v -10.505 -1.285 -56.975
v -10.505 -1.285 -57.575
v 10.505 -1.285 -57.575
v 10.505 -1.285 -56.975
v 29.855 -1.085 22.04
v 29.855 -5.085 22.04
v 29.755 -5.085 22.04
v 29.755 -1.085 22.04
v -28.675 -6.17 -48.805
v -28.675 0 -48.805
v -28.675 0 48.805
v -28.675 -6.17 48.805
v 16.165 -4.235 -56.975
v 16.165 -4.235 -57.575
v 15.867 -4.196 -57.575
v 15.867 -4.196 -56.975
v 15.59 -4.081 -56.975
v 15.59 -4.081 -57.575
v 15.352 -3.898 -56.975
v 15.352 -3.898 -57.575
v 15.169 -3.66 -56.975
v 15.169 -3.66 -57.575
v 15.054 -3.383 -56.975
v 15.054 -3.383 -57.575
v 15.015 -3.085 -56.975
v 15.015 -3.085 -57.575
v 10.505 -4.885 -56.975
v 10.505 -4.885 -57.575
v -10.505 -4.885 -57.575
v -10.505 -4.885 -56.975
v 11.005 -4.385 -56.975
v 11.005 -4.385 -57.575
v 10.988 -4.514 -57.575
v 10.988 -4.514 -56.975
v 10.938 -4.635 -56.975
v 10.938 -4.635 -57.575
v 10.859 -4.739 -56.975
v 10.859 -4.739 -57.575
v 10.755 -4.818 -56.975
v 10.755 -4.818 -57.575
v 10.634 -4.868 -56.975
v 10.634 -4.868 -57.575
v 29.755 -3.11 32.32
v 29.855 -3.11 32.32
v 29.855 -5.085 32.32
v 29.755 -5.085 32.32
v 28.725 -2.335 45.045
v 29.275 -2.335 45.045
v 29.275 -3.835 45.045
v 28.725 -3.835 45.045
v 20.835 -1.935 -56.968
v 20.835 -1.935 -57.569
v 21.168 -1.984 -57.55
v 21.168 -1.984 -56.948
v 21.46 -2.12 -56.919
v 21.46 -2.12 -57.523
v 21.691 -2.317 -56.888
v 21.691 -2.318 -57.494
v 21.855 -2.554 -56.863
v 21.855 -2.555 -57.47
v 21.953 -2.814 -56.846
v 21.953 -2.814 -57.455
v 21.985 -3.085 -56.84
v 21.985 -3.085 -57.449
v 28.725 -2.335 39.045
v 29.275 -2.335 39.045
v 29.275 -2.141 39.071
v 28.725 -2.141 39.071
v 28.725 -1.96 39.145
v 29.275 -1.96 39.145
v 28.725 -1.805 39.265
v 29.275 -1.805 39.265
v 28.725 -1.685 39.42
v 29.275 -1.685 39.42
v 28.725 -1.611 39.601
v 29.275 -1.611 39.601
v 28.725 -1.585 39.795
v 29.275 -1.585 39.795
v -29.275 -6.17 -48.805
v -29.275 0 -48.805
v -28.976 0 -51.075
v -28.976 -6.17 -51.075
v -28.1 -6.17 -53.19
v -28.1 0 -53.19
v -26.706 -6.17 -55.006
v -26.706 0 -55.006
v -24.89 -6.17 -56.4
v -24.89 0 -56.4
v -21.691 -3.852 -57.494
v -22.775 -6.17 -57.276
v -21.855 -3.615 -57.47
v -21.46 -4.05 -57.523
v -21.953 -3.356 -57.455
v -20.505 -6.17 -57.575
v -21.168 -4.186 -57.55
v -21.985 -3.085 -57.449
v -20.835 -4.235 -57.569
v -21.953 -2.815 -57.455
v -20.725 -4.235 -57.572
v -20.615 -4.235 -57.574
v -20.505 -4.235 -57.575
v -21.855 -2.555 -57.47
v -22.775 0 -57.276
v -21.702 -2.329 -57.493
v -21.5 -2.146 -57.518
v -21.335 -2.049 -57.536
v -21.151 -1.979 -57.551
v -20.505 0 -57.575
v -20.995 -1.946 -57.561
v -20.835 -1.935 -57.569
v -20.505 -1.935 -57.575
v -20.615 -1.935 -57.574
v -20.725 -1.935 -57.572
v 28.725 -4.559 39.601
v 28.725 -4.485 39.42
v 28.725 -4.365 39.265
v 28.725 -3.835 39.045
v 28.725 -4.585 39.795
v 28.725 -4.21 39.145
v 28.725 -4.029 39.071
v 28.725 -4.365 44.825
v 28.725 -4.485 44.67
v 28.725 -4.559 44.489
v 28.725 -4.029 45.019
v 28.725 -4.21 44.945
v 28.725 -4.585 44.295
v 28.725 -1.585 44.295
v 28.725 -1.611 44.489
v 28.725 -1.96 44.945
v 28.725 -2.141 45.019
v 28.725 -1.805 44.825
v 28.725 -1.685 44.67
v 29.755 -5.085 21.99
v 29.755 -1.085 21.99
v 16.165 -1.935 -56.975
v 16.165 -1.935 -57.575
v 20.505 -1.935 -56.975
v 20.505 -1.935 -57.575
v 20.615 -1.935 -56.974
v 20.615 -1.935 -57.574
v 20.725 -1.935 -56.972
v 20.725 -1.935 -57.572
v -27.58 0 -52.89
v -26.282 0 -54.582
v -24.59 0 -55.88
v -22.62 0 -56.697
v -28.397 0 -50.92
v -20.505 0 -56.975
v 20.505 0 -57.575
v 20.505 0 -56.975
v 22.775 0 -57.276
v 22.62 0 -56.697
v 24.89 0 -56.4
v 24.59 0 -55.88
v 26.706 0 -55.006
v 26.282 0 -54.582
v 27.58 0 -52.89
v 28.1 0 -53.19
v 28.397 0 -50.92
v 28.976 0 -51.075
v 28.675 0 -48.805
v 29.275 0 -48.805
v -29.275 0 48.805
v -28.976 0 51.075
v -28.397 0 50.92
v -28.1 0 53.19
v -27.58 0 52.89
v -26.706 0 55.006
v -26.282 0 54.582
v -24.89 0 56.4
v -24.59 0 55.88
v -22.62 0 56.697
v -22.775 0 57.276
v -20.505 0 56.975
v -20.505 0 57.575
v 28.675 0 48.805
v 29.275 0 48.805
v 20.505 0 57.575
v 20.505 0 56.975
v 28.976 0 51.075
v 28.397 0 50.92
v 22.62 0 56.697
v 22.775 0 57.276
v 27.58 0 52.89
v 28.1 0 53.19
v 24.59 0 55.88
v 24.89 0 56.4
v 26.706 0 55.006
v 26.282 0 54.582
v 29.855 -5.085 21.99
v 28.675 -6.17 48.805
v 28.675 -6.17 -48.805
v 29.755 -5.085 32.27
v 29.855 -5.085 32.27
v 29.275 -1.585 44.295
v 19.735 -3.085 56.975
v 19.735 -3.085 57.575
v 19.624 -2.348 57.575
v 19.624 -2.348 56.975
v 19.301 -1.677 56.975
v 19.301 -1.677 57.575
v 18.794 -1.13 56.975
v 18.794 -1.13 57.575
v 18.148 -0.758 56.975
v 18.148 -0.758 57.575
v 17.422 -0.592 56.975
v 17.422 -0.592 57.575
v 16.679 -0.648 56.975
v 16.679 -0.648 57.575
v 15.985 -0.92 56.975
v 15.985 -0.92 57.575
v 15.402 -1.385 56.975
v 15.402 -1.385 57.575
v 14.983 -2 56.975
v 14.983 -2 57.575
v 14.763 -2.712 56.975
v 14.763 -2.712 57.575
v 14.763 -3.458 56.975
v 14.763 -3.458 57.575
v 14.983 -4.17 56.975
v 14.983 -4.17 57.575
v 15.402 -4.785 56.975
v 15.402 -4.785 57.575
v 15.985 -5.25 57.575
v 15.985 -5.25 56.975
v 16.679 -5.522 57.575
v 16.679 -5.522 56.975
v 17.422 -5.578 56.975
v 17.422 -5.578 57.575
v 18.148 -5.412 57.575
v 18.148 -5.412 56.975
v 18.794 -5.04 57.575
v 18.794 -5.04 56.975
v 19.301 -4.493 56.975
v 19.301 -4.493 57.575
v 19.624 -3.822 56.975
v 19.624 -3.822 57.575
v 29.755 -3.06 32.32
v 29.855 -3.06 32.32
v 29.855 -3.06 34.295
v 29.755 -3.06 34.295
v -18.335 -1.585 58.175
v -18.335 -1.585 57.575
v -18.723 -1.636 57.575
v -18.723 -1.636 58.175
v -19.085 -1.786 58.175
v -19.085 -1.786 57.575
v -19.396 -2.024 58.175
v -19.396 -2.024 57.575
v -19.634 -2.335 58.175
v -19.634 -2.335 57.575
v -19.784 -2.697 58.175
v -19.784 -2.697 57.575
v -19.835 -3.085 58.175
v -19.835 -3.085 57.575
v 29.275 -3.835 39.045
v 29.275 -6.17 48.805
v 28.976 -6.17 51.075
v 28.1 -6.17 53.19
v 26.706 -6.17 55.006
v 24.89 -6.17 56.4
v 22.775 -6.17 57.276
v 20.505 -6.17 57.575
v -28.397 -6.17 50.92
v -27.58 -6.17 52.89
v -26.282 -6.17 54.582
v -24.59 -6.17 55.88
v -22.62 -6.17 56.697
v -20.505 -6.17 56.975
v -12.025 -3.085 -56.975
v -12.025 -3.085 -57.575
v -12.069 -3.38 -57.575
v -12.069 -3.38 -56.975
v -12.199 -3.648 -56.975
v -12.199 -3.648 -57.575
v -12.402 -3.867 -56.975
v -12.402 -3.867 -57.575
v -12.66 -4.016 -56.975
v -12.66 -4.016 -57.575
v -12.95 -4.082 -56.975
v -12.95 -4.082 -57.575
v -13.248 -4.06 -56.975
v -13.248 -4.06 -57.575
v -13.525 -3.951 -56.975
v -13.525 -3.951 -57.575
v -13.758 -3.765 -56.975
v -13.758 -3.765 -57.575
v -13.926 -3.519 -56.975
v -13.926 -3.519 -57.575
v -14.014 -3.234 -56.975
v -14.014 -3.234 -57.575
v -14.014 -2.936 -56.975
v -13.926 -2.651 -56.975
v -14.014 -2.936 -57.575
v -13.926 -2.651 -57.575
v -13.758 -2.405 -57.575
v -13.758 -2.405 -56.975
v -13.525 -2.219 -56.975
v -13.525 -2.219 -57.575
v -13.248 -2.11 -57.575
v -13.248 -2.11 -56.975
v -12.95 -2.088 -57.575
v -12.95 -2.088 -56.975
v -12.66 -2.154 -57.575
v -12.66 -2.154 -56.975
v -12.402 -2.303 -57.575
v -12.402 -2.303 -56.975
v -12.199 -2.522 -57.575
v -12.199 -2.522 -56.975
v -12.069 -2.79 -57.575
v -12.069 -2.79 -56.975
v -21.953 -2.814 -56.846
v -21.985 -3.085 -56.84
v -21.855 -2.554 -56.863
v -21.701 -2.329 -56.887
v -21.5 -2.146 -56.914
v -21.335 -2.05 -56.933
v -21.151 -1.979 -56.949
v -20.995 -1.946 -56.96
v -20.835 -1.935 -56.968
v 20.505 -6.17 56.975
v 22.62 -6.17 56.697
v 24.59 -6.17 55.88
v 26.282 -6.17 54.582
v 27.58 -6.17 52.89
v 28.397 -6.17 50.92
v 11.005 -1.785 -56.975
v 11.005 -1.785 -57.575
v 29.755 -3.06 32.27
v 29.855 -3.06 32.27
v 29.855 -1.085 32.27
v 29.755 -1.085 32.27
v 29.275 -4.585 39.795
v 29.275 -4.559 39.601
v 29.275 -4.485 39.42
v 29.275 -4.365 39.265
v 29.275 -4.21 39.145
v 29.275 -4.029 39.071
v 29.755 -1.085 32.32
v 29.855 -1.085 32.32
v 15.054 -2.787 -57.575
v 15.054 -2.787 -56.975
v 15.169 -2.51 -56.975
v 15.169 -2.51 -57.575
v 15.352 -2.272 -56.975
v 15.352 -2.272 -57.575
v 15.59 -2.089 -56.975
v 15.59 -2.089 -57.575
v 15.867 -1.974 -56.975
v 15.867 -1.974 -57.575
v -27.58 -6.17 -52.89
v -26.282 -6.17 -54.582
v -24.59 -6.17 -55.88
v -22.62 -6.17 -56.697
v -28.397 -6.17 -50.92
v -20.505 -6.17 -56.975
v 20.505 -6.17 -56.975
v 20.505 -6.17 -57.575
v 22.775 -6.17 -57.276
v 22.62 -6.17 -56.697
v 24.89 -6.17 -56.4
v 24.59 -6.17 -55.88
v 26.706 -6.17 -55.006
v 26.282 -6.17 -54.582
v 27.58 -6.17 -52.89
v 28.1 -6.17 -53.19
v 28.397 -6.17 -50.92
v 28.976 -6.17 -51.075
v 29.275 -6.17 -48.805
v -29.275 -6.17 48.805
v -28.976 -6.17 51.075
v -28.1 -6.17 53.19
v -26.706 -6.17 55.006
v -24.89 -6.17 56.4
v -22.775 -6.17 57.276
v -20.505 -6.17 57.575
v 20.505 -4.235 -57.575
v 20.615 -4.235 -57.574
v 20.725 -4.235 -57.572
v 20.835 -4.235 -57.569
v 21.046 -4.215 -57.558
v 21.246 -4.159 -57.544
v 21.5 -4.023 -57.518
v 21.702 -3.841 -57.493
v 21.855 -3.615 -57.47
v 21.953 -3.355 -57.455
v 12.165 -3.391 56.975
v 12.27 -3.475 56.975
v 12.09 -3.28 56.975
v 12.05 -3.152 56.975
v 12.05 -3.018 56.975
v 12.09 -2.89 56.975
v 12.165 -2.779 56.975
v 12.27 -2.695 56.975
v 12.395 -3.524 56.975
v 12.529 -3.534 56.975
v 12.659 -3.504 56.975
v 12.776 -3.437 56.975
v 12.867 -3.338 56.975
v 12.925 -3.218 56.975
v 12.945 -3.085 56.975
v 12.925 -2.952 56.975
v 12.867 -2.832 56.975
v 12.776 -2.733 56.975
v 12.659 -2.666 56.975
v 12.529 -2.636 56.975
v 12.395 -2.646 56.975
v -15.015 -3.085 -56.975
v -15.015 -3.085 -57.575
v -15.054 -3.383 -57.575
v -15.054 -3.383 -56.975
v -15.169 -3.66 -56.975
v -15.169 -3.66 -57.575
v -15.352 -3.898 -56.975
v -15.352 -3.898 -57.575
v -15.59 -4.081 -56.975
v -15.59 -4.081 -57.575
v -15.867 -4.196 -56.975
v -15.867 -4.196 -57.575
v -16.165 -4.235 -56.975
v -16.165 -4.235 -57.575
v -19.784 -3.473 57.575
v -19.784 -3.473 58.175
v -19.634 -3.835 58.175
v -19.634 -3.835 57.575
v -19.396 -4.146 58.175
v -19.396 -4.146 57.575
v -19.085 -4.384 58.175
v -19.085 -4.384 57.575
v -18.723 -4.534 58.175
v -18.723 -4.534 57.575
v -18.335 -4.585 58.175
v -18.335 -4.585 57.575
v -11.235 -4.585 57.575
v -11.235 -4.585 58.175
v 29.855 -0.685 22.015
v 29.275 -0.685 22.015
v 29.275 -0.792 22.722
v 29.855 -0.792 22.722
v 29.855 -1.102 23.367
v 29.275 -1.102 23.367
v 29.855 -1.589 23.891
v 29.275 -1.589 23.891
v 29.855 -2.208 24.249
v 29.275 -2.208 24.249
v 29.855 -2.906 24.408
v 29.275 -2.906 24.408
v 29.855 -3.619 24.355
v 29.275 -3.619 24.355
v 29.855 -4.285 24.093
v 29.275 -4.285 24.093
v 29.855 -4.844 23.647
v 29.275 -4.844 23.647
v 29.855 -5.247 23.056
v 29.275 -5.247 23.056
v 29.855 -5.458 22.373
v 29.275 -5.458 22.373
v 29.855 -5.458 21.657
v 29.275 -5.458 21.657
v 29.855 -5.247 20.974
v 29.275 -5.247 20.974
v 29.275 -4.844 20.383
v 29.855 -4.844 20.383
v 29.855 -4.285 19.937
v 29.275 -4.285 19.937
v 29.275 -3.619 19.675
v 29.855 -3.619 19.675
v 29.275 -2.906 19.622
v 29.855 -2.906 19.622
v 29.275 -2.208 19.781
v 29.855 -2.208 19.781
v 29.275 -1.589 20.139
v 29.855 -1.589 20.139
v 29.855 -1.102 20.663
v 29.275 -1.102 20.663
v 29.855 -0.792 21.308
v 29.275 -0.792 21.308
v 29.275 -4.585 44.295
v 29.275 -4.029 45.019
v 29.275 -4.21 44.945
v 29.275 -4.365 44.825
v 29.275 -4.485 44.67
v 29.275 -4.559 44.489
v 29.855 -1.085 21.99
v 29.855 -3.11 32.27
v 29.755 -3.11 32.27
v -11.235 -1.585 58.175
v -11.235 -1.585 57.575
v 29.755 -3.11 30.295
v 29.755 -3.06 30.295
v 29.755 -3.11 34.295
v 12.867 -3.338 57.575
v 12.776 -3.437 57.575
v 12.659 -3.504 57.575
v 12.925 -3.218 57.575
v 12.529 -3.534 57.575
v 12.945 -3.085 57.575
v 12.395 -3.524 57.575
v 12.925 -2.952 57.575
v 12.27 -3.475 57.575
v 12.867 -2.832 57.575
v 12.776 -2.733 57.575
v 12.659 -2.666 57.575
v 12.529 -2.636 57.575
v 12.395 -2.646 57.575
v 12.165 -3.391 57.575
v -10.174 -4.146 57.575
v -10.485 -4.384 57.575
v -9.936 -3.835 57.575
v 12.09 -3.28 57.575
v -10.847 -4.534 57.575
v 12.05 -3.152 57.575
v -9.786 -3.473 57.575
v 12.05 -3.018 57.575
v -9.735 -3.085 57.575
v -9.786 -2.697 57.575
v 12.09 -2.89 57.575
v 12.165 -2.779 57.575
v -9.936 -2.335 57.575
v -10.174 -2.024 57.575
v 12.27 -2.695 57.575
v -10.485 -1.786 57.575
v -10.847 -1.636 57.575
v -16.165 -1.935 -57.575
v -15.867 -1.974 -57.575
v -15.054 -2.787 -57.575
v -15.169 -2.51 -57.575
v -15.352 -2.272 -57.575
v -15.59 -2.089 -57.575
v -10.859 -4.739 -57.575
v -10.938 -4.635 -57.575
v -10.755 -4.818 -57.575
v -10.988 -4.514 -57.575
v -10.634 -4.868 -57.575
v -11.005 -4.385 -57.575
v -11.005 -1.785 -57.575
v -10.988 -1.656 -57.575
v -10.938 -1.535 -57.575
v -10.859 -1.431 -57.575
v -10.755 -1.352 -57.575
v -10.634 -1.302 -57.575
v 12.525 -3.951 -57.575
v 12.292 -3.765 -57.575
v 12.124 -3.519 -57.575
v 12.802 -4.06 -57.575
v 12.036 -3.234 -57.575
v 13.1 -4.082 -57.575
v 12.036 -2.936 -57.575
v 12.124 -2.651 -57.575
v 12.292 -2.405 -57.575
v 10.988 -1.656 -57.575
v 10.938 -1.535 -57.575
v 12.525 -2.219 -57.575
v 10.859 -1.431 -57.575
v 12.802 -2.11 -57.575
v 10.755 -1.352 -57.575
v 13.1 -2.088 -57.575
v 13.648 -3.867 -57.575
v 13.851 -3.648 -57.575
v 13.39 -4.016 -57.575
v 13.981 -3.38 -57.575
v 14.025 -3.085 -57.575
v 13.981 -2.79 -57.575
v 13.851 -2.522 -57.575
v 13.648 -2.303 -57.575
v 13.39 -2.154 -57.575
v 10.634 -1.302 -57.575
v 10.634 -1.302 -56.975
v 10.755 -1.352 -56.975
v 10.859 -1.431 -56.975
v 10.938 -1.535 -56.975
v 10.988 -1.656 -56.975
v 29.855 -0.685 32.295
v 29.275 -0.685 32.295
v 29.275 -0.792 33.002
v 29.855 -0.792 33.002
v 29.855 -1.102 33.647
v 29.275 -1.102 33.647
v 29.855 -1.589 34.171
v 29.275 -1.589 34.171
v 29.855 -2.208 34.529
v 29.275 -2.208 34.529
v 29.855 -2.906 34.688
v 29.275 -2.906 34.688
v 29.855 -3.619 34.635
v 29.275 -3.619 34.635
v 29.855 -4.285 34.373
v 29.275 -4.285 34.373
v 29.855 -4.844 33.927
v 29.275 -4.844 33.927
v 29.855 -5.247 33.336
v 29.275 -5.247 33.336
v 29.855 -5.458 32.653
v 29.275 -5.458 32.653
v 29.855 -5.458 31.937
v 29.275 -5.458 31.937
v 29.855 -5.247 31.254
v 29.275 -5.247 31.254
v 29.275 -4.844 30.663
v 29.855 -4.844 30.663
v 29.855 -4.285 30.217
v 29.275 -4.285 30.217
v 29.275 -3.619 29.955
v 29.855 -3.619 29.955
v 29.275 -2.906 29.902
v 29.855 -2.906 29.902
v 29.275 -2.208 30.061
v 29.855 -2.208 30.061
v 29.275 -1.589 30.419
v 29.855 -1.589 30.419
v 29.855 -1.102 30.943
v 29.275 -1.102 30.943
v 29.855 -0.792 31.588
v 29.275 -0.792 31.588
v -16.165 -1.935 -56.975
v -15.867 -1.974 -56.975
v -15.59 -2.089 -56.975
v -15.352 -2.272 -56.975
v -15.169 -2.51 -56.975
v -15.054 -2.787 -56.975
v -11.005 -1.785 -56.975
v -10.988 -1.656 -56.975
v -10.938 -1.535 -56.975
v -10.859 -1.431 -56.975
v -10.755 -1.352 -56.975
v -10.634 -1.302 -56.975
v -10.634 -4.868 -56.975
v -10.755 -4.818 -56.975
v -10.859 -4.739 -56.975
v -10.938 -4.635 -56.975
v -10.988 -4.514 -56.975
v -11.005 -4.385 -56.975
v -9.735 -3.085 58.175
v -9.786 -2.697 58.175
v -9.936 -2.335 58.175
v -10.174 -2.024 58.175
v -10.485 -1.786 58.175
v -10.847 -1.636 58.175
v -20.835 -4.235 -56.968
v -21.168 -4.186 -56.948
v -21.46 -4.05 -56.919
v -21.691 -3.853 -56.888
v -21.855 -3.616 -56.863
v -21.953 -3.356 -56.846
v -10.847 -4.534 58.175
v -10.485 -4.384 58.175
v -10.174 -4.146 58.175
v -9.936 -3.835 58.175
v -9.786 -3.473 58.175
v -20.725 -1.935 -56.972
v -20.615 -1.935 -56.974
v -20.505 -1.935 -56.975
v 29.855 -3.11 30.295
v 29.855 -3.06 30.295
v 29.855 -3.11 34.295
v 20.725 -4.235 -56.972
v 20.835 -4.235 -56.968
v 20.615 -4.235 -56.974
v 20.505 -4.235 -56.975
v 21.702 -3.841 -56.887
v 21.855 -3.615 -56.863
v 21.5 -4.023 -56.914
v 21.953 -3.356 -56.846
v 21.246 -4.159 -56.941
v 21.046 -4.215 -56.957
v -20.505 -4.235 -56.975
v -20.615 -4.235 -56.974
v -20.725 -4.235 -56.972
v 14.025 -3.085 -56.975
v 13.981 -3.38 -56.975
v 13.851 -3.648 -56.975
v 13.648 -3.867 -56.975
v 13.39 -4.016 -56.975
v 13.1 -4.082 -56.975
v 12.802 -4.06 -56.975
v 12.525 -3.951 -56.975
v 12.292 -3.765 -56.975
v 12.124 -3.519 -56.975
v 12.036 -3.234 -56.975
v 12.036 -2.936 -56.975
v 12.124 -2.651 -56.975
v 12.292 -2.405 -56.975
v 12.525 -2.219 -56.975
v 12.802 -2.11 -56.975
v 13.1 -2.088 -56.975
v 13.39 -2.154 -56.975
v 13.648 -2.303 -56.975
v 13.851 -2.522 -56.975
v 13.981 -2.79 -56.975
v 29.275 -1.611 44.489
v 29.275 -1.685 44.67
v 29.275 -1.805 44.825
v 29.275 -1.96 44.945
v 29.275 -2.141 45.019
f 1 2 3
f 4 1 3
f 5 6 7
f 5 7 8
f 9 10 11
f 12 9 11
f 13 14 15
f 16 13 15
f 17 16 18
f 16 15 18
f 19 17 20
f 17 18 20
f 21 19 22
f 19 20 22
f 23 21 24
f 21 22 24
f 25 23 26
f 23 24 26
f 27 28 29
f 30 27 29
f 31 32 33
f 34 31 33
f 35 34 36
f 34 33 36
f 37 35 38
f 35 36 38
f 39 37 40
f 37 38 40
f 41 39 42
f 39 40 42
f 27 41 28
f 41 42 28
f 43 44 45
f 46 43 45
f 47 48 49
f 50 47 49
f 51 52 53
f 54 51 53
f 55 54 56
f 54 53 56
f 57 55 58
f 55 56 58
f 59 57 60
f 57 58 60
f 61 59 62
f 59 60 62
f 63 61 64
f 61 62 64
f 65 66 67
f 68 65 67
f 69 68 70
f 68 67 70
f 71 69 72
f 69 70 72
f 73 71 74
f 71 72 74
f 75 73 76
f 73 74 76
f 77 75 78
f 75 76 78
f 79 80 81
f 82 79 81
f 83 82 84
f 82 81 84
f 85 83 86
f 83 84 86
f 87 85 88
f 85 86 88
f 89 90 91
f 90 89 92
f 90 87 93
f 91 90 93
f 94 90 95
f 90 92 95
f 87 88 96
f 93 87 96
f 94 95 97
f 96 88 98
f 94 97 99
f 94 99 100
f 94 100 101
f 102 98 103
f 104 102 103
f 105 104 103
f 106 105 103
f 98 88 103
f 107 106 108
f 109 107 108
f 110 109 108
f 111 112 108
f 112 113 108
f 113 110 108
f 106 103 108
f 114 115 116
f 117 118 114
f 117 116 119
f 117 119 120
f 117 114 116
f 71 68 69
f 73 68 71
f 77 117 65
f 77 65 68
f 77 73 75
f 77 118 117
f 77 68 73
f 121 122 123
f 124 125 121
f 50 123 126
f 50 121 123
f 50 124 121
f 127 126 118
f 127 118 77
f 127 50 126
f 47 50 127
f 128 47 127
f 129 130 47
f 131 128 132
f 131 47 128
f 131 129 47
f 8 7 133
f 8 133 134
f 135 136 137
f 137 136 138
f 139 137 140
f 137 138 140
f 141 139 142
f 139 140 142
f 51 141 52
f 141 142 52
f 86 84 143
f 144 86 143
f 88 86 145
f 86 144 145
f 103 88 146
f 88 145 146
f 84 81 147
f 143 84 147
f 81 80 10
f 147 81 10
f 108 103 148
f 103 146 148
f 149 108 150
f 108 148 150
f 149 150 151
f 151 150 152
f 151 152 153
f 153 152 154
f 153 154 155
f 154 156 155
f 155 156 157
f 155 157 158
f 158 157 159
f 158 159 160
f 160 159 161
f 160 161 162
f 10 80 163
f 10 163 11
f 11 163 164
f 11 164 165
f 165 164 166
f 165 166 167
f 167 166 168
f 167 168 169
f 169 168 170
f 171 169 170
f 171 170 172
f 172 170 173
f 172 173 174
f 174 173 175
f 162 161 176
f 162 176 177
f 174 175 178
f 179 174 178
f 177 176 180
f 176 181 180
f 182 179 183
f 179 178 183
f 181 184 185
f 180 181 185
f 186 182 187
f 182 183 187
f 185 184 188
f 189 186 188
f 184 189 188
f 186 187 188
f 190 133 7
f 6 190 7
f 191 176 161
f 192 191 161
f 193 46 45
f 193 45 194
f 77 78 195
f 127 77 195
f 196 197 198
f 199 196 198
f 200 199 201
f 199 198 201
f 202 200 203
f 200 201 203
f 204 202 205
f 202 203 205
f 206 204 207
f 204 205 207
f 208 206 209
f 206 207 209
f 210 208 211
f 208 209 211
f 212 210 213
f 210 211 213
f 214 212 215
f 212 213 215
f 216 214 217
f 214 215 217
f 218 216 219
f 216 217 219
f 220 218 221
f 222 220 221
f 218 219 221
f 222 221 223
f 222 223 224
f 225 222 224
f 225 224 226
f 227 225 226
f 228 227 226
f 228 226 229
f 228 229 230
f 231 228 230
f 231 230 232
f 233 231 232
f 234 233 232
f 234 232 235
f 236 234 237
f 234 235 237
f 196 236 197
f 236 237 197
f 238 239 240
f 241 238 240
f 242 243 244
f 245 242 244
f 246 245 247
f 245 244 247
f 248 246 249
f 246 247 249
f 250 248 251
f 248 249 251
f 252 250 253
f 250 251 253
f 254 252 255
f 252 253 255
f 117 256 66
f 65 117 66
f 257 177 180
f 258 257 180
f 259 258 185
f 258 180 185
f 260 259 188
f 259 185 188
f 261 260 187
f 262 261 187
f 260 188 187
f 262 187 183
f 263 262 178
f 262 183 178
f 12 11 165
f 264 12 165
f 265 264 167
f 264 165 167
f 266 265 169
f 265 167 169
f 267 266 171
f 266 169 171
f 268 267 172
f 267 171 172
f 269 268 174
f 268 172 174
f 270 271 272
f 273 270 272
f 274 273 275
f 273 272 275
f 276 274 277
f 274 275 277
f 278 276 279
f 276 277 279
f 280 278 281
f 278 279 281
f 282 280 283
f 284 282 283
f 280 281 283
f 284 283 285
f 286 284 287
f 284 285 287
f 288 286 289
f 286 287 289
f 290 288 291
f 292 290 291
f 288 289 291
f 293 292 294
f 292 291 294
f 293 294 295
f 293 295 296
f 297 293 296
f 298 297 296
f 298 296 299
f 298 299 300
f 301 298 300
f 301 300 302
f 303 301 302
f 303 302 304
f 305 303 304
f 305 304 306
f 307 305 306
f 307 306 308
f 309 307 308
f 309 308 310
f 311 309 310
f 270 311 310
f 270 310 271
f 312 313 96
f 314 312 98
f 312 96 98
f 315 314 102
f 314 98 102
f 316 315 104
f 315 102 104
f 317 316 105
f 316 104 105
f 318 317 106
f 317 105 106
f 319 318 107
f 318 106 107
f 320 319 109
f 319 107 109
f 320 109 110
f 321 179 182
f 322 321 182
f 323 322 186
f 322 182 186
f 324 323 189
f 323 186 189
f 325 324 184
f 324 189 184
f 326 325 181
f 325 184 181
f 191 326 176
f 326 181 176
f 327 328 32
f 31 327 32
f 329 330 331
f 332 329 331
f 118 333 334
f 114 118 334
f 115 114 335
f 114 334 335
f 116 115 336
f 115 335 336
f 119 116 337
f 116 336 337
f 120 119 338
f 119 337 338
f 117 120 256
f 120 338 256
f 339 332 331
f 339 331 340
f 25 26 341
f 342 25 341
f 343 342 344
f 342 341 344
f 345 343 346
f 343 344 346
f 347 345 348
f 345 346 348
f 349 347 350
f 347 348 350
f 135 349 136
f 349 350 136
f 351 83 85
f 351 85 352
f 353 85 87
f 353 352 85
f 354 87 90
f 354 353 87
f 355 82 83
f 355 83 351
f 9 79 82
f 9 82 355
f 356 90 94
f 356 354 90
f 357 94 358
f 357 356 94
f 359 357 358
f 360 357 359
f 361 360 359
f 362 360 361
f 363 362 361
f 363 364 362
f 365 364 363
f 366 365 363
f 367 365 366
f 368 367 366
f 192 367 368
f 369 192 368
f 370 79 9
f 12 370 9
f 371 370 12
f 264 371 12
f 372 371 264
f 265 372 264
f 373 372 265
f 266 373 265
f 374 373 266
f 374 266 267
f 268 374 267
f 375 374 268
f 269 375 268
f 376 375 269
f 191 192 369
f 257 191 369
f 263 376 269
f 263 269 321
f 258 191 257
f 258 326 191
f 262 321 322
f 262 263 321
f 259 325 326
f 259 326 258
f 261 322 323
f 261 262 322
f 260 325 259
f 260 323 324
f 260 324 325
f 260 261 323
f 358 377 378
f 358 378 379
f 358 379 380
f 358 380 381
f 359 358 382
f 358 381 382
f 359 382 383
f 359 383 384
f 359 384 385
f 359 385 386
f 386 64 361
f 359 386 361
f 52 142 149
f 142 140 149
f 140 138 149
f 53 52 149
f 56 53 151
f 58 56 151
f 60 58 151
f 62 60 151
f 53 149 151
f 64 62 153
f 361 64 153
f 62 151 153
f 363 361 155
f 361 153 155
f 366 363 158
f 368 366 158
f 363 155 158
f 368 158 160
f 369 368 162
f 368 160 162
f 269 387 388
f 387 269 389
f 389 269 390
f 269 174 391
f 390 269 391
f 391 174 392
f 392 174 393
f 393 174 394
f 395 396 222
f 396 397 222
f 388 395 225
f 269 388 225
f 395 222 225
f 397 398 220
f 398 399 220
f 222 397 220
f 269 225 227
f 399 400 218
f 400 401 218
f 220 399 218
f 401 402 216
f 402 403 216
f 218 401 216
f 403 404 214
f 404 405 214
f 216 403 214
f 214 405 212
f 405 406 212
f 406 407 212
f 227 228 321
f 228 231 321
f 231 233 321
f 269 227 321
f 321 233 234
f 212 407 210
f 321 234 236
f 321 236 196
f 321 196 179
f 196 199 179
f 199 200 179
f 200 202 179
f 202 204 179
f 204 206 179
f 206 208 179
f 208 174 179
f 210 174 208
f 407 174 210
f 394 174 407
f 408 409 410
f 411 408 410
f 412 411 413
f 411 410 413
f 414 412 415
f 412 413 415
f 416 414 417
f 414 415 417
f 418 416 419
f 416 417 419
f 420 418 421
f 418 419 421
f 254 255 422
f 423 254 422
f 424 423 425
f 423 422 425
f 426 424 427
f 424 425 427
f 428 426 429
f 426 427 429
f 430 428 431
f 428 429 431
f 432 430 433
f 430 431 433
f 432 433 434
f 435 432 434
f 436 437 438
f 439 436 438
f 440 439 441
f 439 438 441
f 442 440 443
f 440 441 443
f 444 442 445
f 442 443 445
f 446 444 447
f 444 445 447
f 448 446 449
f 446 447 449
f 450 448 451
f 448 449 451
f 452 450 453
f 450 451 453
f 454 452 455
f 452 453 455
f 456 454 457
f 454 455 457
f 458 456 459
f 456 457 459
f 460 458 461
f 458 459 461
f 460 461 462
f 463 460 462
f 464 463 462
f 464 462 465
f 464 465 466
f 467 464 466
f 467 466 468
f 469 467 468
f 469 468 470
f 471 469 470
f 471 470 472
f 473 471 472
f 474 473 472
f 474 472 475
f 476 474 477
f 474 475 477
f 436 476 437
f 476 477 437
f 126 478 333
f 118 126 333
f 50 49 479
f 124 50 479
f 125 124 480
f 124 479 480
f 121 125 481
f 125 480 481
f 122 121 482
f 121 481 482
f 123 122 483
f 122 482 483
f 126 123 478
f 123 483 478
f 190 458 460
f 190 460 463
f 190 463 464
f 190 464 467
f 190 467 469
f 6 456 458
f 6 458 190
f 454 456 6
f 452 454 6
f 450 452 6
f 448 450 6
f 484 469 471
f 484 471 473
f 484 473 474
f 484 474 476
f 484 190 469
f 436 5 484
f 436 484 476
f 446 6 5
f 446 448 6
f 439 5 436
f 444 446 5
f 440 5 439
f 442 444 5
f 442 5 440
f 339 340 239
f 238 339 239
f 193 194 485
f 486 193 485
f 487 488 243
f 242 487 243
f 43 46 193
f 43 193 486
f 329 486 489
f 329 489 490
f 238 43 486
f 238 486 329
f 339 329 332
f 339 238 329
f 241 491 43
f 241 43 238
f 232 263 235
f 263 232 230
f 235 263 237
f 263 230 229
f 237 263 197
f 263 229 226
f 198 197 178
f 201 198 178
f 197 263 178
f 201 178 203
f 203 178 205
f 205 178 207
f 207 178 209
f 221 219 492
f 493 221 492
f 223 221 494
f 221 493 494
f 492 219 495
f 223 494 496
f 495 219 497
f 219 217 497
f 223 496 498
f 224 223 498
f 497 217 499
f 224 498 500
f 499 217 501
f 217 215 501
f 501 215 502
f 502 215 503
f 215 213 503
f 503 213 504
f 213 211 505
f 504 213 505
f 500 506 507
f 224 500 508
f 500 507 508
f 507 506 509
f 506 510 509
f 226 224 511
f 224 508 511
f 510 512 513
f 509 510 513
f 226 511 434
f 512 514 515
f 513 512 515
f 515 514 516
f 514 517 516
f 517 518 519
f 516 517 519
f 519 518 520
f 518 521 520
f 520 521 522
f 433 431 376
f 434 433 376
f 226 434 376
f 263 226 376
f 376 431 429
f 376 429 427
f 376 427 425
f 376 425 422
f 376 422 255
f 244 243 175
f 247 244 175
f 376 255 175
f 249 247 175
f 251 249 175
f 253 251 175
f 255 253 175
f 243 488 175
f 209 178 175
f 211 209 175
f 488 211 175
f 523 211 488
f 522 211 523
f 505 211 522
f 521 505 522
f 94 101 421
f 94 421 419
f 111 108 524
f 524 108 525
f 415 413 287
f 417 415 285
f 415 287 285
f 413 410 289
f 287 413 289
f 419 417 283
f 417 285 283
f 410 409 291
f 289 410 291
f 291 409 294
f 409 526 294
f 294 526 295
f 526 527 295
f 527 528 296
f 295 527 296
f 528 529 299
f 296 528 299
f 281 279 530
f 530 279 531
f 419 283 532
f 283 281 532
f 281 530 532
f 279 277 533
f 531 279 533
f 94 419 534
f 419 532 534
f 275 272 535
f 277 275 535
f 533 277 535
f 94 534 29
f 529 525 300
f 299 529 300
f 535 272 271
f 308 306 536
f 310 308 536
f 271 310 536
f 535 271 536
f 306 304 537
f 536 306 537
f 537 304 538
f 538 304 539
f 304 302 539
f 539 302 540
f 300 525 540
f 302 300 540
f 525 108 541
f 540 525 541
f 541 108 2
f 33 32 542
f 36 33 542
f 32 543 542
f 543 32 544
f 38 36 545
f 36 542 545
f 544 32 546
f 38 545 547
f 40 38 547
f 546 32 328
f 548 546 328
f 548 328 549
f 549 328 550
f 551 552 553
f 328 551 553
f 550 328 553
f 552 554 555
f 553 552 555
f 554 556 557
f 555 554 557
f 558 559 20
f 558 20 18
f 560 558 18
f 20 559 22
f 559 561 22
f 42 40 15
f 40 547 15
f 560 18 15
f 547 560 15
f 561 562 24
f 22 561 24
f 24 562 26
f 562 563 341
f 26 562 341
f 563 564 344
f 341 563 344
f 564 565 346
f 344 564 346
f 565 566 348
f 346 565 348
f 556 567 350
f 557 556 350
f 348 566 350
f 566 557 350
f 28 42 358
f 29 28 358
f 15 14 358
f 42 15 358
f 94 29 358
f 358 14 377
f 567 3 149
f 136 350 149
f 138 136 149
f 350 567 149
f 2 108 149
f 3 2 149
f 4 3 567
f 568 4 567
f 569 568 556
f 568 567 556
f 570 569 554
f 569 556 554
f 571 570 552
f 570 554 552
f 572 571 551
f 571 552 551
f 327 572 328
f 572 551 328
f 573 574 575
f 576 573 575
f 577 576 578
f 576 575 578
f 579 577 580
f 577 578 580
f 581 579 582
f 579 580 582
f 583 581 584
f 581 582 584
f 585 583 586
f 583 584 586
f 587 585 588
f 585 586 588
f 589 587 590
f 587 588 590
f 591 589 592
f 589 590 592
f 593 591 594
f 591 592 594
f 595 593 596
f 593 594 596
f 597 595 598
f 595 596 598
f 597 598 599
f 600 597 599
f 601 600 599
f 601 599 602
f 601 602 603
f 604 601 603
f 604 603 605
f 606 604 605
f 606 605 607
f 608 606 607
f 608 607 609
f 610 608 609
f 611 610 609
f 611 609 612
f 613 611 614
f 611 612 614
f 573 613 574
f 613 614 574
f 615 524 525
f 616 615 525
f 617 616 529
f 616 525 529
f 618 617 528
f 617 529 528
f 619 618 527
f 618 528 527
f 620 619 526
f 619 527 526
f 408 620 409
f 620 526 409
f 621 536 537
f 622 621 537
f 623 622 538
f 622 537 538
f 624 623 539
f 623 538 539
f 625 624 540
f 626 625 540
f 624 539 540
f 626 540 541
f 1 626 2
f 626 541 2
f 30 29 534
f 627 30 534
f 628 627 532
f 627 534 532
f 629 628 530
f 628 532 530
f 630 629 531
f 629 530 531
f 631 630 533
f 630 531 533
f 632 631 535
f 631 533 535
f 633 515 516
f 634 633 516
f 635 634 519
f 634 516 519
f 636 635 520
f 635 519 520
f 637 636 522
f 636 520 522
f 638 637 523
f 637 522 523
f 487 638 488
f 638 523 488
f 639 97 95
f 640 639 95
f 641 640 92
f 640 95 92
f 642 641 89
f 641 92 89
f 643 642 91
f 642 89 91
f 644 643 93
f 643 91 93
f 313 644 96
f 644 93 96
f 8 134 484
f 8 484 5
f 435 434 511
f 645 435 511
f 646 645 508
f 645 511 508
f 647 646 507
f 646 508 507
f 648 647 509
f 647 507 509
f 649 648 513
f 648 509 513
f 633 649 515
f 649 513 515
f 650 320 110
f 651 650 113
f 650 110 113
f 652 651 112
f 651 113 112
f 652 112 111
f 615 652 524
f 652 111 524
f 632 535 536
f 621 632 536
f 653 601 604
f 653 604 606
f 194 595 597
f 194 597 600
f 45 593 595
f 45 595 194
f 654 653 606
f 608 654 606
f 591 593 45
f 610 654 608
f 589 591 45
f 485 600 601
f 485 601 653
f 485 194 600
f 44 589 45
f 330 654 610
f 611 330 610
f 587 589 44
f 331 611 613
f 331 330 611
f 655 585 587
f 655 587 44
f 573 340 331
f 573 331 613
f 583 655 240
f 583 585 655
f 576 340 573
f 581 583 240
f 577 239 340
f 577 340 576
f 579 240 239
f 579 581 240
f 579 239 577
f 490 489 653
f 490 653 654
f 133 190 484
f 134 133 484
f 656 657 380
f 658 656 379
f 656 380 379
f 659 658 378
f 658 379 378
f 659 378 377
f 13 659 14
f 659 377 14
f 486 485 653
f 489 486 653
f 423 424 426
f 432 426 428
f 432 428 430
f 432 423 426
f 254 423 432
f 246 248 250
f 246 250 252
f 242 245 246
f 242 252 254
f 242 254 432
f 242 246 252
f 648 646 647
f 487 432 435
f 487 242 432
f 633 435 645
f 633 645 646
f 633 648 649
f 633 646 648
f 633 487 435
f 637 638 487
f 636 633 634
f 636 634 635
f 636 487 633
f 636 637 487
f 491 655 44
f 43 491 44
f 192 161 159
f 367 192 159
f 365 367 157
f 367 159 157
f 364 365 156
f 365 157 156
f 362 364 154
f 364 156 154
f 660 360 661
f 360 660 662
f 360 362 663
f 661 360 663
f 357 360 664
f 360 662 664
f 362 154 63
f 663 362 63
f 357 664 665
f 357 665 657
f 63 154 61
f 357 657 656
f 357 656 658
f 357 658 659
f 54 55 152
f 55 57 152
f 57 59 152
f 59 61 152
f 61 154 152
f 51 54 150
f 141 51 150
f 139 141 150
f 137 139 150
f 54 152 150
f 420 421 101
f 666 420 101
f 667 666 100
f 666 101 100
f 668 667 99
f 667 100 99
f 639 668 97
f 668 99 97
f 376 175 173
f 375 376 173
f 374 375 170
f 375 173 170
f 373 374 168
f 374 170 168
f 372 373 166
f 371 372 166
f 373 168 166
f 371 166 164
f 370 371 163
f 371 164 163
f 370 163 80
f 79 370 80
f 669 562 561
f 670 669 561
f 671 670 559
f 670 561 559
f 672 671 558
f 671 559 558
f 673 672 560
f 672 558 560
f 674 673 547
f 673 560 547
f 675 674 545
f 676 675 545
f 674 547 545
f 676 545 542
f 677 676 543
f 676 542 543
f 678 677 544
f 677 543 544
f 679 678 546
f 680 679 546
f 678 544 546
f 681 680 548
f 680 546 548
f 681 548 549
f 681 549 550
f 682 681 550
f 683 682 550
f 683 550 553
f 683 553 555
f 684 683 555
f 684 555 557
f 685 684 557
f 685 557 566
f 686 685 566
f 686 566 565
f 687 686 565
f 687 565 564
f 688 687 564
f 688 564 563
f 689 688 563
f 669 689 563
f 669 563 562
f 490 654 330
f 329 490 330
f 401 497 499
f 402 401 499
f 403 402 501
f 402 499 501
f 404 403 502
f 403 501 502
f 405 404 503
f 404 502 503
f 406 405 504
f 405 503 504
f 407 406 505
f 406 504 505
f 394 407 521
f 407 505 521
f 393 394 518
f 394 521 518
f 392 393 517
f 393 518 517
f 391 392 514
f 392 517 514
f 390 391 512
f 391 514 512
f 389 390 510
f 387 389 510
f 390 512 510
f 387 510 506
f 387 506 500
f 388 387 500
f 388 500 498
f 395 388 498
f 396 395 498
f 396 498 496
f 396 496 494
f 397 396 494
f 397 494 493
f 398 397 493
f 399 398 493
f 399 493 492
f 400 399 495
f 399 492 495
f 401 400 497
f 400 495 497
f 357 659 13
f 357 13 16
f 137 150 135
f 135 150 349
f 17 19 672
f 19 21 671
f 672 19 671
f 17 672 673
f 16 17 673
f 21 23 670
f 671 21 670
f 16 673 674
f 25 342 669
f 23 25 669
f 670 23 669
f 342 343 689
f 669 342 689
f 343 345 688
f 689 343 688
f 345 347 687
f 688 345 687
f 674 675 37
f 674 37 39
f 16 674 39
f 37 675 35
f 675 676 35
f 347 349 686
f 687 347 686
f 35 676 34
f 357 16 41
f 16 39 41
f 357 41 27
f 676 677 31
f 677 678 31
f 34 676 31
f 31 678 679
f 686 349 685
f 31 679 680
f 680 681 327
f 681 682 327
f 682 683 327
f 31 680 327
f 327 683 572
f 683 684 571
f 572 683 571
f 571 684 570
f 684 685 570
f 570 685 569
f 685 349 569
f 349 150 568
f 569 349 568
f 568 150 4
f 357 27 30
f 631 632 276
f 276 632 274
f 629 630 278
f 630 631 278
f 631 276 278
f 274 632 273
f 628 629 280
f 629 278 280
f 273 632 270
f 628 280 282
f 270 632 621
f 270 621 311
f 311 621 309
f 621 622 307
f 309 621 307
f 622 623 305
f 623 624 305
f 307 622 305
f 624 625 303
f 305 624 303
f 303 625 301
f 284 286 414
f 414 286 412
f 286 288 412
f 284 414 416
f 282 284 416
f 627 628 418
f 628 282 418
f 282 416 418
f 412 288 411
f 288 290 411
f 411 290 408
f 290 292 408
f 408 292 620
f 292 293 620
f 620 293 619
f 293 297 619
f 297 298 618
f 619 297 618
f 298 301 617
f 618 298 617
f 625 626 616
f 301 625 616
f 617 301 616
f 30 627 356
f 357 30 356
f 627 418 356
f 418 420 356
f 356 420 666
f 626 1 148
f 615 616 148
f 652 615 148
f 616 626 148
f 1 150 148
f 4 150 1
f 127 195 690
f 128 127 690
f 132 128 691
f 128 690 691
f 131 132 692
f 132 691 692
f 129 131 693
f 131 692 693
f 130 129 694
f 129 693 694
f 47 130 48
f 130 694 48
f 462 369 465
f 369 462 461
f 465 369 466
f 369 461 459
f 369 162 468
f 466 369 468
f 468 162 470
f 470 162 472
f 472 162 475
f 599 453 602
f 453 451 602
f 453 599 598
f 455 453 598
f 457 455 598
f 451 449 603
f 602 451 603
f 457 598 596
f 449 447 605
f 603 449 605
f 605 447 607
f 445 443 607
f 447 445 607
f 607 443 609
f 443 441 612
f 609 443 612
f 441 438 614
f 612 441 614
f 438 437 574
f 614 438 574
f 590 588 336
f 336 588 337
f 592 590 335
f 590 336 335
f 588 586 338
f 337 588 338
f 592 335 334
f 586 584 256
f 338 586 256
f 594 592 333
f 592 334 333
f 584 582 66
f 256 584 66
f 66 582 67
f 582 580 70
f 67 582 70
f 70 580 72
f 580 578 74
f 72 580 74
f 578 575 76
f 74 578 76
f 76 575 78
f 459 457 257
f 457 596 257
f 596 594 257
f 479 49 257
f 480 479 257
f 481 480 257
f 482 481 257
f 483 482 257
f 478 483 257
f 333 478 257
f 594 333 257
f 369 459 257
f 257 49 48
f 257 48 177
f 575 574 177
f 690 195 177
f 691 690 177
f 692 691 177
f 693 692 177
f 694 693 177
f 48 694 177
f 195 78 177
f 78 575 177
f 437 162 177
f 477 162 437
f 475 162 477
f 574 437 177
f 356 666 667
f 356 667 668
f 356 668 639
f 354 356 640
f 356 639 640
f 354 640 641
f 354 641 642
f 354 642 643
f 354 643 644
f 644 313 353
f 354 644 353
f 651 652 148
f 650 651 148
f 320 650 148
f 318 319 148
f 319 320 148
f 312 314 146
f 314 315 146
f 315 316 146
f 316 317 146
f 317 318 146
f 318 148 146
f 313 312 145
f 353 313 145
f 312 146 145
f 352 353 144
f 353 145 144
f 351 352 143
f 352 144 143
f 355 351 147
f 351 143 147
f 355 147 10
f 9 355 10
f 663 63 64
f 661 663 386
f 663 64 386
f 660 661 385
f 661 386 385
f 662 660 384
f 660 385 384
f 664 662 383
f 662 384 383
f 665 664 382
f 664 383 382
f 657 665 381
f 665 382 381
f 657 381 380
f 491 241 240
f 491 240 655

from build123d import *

# Parameters (mm, degrees)
F1_DEPTH  = 6.17
F3_DEPTH  = 0.55
F2_R      = 2.4
F4_DEPTH  = 0.58
F6_W      = 4
F6_H      = 0.05
F7_DEPTH  = 0.1
F8_R      = 2.5
F8_R_2    = 0.45
F9_DEPTH  = 0.6
F10_DEPTH = 0.6
F11_R     = 1
F12_DEPTH = 0.7361696724


with BuildPart() as f1:
    # F0 (on Front) → F1 (new body)
    with BuildSketch(Plane.XZ):
        with BuildLine():
            Line((-20.505, -57.575), (20.505, -57.575))
            ThreePointArc((20.505, -57.575), (26.706326471, -55.006326471), (29.275, -48.805))
            Line((29.275, -48.805), (29.275, 48.805))
            ThreePointArc((29.275, 48.805), (26.706326471, 55.006326471), (20.505, 57.575))
            Line((20.505, 57.575), (-20.505, 57.575))
            ThreePointArc((-20.505, 57.575), (-26.706326471, 55.006326471), (-29.275, 48.805))
            Line((-29.275, 48.805), (-29.275, -48.805))
            ThreePointArc((-29.275, -48.805), (-26.706326471, -55.006326471), (-20.505, -57.575))
        make_face()
        with BuildLine():
            ThreePointArc((28.675, -48.805), (26.2820624023, -54.5820624023), (20.505, -56.975))
            Line((20.505, -56.975), (-20.505, -56.975))
            ThreePointArc((-20.505, -56.975), (-26.2820624023, -54.5820624023), (-28.675, -48.805))
            Line((-28.675, -48.805), (-28.675, 48.805))
            ThreePointArc((-28.675, 48.805), (-26.2820624023, 54.5820624023), (-20.505, 56.975))
            Line((-20.505, 56.975), (20.505, 56.975))
            ThreePointArc((20.505, 56.975), (26.2820624023, 54.5820624023), (28.675, 48.805))
            Line((28.675, 48.805), (28.675, -48.805))
        make_face(mode=Mode.SUBTRACT)
    extrude(amount=F1_DEPTH)

    # F2 (on face) → F3 (cut)
    with BuildSketch(Plane.YZ.offset(29.275)):
        with BuildLine():
            Line((-2.335, 45.045), (-3.835, 45.045))
            ThreePointArc((-3.835, 45.045), (-4.3653300859, 44.8253300859), (-4.585, 44.295))
            Line((-4.585, 44.295), (-4.585, 39.795))
            ThreePointArc((-4.585, 39.795), (-4.3653300859, 39.2646699141), (-3.835, 39.045))
            Line((-3.835, 39.045), (-2.335, 39.045))
            ThreePointArc((-2.335, 39.045), (-1.8046699141, 39.2646699141), (-1.585, 39.795))
            Line((-1.585, 39.795), (-1.585, 44.295))
            ThreePointArc((-1.585, 44.295), (-1.8046699141, 44.8253300859), (-2.335, 45.045))
        make_face()
    extrude(amount=-F3_DEPTH, mode=Mode.SUBTRACT)

    # F2 (on face) → F4 (join)
    with BuildSketch(Plane.YZ.offset(29.275)):
        with Locations((-3.085, 32.295)):
            Circle(F2_R)
        with Locations((-3.085, 22.015)):
            Circle(F2_R)
    extrude(amount=F4_DEPTH)

    # F5 (on face) + F6 (on face) → F7 (cut)
    with BuildSketch(Plane.YZ.offset(29.855)):
        Polygon((-3.11, 32.27), (-3.11, 30.295), (-3.06, 30.295), (-3.06, 32.27), (-1.085, 32.27), (-1.085, 32.32), (-3.06, 32.32), (-3.06, 34.295), (-3.11, 34.295), (-3.11, 32.32), (-5.085, 32.32), (-5.085, 32.27), align=None)
    with BuildSketch(Plane.YZ.offset(29.855)):
        with Locations((-3.085, 22.015)):
            Rectangle(F6_W, F6_H)
    extrude(amount=-F7_DEPTH, mode=Mode.SUBTRACT)

    # F8 (on face) → F9 (cut)
    with BuildSketch(Plane.XY.offset(57.575)):
        with Locations((17.235, -3.085)):
            Circle(F8_R)
        with Locations((12.495, -3.085)):
            Circle(F8_R_2)
    extrude(amount=-F9_DEPTH, mode=Mode.SUBTRACT)

    # F8 (on face) → F10 (join)
    with BuildSketch(Plane.XY.offset(57.575)):
        with BuildLine():
            ThreePointArc((-19.835, -3.085), (-19.3956601718, -4.1456601718), (-18.335, -4.585))
            Line((-18.335, -4.585), (-11.235, -4.585))
            ThreePointArc((-11.235, -4.585), (-10.1743398282, -4.1456601718), (-9.735, -3.085))
            ThreePointArc((-9.735, -3.085), (-10.1743398282, -2.0243398282), (-11.235, -1.585))
            Line((-11.235, -1.585), (-18.335, -1.585))
            ThreePointArc((-18.335, -1.585), (-19.3956601718, -2.0243398282), (-19.835, -3.085))
        make_face()
    extrude(amount=F10_DEPTH)

    # F11 (on face) → F12 (cut, through all)
    with BuildSketch(Plane(origin=(0, 0, -57.575), x_dir=(1, 0, 0), z_dir=(0, 0, -1))):
        with BuildLine():
            Line((-10.505, 1.285), (10.505, 1.285))
            ThreePointArc((10.505, 1.285), (10.8585533906, 1.4314466094), (11.005, 1.785))
            Line((11.005, 1.785), (11.005, 4.385))
            ThreePointArc((11.005, 4.385), (10.8585533906, 4.7385533906), (10.505, 4.885))
            Line((10.505, 4.885), (-10.505, 4.885))
            ThreePointArc((-10.505, 4.885), (-10.8585533906, 4.7385533906), (-11.005, 4.385))
            Line((-11.005, 4.385), (-11.005, 1.785))
            ThreePointArc((-11.005, 1.785), (-10.8585533906, 1.4314466094), (-10.505, 1.285))
        make_face()
        with Locations((-13.025, 3.085)):
            Circle(F11_R)
        with Locations((13.025, 3.085)):
            Circle(F11_R)
        with BuildLine():
            Line((-20.835, 1.935), (-16.165, 1.935))
            ThreePointArc((-16.165, 1.935), (-15.3518272016, 2.2718272016), (-15.015, 3.085))
            ThreePointArc((-15.015, 3.085), (-15.3518272016, 3.8981727984), (-16.165, 4.235))
            Line((-16.165, 4.235), (-20.835, 4.235))
            ThreePointArc((-20.835, 4.235), (-21.6481727984, 3.8981727984), (-21.985, 3.085))
            ThreePointArc((-21.985, 3.085), (-21.6481727984, 2.2718272016), (-20.835, 1.935))
        make_face()
        with BuildLine():
            Line((16.165, 1.935), (20.835, 1.935))
            ThreePointArc((20.835, 1.935), (21.6481727984, 2.2718272016), (21.985, 3.085))
            ThreePointArc((21.985, 3.085), (21.6481727984, 3.8981727984), (20.835, 4.235))
            Line((20.835, 4.235), (16.165, 4.235))
            ThreePointArc((16.165, 4.235), (15.3518272016, 3.8981727984), (15.015, 3.085))
            ThreePointArc((15.015, 3.085), (15.3518272016, 2.2718272016), (16.165, 1.935))
        make_face()
    extrude(amount=-F12_DEPTH, mode=Mode.SUBTRACT)


solid = f1.part
